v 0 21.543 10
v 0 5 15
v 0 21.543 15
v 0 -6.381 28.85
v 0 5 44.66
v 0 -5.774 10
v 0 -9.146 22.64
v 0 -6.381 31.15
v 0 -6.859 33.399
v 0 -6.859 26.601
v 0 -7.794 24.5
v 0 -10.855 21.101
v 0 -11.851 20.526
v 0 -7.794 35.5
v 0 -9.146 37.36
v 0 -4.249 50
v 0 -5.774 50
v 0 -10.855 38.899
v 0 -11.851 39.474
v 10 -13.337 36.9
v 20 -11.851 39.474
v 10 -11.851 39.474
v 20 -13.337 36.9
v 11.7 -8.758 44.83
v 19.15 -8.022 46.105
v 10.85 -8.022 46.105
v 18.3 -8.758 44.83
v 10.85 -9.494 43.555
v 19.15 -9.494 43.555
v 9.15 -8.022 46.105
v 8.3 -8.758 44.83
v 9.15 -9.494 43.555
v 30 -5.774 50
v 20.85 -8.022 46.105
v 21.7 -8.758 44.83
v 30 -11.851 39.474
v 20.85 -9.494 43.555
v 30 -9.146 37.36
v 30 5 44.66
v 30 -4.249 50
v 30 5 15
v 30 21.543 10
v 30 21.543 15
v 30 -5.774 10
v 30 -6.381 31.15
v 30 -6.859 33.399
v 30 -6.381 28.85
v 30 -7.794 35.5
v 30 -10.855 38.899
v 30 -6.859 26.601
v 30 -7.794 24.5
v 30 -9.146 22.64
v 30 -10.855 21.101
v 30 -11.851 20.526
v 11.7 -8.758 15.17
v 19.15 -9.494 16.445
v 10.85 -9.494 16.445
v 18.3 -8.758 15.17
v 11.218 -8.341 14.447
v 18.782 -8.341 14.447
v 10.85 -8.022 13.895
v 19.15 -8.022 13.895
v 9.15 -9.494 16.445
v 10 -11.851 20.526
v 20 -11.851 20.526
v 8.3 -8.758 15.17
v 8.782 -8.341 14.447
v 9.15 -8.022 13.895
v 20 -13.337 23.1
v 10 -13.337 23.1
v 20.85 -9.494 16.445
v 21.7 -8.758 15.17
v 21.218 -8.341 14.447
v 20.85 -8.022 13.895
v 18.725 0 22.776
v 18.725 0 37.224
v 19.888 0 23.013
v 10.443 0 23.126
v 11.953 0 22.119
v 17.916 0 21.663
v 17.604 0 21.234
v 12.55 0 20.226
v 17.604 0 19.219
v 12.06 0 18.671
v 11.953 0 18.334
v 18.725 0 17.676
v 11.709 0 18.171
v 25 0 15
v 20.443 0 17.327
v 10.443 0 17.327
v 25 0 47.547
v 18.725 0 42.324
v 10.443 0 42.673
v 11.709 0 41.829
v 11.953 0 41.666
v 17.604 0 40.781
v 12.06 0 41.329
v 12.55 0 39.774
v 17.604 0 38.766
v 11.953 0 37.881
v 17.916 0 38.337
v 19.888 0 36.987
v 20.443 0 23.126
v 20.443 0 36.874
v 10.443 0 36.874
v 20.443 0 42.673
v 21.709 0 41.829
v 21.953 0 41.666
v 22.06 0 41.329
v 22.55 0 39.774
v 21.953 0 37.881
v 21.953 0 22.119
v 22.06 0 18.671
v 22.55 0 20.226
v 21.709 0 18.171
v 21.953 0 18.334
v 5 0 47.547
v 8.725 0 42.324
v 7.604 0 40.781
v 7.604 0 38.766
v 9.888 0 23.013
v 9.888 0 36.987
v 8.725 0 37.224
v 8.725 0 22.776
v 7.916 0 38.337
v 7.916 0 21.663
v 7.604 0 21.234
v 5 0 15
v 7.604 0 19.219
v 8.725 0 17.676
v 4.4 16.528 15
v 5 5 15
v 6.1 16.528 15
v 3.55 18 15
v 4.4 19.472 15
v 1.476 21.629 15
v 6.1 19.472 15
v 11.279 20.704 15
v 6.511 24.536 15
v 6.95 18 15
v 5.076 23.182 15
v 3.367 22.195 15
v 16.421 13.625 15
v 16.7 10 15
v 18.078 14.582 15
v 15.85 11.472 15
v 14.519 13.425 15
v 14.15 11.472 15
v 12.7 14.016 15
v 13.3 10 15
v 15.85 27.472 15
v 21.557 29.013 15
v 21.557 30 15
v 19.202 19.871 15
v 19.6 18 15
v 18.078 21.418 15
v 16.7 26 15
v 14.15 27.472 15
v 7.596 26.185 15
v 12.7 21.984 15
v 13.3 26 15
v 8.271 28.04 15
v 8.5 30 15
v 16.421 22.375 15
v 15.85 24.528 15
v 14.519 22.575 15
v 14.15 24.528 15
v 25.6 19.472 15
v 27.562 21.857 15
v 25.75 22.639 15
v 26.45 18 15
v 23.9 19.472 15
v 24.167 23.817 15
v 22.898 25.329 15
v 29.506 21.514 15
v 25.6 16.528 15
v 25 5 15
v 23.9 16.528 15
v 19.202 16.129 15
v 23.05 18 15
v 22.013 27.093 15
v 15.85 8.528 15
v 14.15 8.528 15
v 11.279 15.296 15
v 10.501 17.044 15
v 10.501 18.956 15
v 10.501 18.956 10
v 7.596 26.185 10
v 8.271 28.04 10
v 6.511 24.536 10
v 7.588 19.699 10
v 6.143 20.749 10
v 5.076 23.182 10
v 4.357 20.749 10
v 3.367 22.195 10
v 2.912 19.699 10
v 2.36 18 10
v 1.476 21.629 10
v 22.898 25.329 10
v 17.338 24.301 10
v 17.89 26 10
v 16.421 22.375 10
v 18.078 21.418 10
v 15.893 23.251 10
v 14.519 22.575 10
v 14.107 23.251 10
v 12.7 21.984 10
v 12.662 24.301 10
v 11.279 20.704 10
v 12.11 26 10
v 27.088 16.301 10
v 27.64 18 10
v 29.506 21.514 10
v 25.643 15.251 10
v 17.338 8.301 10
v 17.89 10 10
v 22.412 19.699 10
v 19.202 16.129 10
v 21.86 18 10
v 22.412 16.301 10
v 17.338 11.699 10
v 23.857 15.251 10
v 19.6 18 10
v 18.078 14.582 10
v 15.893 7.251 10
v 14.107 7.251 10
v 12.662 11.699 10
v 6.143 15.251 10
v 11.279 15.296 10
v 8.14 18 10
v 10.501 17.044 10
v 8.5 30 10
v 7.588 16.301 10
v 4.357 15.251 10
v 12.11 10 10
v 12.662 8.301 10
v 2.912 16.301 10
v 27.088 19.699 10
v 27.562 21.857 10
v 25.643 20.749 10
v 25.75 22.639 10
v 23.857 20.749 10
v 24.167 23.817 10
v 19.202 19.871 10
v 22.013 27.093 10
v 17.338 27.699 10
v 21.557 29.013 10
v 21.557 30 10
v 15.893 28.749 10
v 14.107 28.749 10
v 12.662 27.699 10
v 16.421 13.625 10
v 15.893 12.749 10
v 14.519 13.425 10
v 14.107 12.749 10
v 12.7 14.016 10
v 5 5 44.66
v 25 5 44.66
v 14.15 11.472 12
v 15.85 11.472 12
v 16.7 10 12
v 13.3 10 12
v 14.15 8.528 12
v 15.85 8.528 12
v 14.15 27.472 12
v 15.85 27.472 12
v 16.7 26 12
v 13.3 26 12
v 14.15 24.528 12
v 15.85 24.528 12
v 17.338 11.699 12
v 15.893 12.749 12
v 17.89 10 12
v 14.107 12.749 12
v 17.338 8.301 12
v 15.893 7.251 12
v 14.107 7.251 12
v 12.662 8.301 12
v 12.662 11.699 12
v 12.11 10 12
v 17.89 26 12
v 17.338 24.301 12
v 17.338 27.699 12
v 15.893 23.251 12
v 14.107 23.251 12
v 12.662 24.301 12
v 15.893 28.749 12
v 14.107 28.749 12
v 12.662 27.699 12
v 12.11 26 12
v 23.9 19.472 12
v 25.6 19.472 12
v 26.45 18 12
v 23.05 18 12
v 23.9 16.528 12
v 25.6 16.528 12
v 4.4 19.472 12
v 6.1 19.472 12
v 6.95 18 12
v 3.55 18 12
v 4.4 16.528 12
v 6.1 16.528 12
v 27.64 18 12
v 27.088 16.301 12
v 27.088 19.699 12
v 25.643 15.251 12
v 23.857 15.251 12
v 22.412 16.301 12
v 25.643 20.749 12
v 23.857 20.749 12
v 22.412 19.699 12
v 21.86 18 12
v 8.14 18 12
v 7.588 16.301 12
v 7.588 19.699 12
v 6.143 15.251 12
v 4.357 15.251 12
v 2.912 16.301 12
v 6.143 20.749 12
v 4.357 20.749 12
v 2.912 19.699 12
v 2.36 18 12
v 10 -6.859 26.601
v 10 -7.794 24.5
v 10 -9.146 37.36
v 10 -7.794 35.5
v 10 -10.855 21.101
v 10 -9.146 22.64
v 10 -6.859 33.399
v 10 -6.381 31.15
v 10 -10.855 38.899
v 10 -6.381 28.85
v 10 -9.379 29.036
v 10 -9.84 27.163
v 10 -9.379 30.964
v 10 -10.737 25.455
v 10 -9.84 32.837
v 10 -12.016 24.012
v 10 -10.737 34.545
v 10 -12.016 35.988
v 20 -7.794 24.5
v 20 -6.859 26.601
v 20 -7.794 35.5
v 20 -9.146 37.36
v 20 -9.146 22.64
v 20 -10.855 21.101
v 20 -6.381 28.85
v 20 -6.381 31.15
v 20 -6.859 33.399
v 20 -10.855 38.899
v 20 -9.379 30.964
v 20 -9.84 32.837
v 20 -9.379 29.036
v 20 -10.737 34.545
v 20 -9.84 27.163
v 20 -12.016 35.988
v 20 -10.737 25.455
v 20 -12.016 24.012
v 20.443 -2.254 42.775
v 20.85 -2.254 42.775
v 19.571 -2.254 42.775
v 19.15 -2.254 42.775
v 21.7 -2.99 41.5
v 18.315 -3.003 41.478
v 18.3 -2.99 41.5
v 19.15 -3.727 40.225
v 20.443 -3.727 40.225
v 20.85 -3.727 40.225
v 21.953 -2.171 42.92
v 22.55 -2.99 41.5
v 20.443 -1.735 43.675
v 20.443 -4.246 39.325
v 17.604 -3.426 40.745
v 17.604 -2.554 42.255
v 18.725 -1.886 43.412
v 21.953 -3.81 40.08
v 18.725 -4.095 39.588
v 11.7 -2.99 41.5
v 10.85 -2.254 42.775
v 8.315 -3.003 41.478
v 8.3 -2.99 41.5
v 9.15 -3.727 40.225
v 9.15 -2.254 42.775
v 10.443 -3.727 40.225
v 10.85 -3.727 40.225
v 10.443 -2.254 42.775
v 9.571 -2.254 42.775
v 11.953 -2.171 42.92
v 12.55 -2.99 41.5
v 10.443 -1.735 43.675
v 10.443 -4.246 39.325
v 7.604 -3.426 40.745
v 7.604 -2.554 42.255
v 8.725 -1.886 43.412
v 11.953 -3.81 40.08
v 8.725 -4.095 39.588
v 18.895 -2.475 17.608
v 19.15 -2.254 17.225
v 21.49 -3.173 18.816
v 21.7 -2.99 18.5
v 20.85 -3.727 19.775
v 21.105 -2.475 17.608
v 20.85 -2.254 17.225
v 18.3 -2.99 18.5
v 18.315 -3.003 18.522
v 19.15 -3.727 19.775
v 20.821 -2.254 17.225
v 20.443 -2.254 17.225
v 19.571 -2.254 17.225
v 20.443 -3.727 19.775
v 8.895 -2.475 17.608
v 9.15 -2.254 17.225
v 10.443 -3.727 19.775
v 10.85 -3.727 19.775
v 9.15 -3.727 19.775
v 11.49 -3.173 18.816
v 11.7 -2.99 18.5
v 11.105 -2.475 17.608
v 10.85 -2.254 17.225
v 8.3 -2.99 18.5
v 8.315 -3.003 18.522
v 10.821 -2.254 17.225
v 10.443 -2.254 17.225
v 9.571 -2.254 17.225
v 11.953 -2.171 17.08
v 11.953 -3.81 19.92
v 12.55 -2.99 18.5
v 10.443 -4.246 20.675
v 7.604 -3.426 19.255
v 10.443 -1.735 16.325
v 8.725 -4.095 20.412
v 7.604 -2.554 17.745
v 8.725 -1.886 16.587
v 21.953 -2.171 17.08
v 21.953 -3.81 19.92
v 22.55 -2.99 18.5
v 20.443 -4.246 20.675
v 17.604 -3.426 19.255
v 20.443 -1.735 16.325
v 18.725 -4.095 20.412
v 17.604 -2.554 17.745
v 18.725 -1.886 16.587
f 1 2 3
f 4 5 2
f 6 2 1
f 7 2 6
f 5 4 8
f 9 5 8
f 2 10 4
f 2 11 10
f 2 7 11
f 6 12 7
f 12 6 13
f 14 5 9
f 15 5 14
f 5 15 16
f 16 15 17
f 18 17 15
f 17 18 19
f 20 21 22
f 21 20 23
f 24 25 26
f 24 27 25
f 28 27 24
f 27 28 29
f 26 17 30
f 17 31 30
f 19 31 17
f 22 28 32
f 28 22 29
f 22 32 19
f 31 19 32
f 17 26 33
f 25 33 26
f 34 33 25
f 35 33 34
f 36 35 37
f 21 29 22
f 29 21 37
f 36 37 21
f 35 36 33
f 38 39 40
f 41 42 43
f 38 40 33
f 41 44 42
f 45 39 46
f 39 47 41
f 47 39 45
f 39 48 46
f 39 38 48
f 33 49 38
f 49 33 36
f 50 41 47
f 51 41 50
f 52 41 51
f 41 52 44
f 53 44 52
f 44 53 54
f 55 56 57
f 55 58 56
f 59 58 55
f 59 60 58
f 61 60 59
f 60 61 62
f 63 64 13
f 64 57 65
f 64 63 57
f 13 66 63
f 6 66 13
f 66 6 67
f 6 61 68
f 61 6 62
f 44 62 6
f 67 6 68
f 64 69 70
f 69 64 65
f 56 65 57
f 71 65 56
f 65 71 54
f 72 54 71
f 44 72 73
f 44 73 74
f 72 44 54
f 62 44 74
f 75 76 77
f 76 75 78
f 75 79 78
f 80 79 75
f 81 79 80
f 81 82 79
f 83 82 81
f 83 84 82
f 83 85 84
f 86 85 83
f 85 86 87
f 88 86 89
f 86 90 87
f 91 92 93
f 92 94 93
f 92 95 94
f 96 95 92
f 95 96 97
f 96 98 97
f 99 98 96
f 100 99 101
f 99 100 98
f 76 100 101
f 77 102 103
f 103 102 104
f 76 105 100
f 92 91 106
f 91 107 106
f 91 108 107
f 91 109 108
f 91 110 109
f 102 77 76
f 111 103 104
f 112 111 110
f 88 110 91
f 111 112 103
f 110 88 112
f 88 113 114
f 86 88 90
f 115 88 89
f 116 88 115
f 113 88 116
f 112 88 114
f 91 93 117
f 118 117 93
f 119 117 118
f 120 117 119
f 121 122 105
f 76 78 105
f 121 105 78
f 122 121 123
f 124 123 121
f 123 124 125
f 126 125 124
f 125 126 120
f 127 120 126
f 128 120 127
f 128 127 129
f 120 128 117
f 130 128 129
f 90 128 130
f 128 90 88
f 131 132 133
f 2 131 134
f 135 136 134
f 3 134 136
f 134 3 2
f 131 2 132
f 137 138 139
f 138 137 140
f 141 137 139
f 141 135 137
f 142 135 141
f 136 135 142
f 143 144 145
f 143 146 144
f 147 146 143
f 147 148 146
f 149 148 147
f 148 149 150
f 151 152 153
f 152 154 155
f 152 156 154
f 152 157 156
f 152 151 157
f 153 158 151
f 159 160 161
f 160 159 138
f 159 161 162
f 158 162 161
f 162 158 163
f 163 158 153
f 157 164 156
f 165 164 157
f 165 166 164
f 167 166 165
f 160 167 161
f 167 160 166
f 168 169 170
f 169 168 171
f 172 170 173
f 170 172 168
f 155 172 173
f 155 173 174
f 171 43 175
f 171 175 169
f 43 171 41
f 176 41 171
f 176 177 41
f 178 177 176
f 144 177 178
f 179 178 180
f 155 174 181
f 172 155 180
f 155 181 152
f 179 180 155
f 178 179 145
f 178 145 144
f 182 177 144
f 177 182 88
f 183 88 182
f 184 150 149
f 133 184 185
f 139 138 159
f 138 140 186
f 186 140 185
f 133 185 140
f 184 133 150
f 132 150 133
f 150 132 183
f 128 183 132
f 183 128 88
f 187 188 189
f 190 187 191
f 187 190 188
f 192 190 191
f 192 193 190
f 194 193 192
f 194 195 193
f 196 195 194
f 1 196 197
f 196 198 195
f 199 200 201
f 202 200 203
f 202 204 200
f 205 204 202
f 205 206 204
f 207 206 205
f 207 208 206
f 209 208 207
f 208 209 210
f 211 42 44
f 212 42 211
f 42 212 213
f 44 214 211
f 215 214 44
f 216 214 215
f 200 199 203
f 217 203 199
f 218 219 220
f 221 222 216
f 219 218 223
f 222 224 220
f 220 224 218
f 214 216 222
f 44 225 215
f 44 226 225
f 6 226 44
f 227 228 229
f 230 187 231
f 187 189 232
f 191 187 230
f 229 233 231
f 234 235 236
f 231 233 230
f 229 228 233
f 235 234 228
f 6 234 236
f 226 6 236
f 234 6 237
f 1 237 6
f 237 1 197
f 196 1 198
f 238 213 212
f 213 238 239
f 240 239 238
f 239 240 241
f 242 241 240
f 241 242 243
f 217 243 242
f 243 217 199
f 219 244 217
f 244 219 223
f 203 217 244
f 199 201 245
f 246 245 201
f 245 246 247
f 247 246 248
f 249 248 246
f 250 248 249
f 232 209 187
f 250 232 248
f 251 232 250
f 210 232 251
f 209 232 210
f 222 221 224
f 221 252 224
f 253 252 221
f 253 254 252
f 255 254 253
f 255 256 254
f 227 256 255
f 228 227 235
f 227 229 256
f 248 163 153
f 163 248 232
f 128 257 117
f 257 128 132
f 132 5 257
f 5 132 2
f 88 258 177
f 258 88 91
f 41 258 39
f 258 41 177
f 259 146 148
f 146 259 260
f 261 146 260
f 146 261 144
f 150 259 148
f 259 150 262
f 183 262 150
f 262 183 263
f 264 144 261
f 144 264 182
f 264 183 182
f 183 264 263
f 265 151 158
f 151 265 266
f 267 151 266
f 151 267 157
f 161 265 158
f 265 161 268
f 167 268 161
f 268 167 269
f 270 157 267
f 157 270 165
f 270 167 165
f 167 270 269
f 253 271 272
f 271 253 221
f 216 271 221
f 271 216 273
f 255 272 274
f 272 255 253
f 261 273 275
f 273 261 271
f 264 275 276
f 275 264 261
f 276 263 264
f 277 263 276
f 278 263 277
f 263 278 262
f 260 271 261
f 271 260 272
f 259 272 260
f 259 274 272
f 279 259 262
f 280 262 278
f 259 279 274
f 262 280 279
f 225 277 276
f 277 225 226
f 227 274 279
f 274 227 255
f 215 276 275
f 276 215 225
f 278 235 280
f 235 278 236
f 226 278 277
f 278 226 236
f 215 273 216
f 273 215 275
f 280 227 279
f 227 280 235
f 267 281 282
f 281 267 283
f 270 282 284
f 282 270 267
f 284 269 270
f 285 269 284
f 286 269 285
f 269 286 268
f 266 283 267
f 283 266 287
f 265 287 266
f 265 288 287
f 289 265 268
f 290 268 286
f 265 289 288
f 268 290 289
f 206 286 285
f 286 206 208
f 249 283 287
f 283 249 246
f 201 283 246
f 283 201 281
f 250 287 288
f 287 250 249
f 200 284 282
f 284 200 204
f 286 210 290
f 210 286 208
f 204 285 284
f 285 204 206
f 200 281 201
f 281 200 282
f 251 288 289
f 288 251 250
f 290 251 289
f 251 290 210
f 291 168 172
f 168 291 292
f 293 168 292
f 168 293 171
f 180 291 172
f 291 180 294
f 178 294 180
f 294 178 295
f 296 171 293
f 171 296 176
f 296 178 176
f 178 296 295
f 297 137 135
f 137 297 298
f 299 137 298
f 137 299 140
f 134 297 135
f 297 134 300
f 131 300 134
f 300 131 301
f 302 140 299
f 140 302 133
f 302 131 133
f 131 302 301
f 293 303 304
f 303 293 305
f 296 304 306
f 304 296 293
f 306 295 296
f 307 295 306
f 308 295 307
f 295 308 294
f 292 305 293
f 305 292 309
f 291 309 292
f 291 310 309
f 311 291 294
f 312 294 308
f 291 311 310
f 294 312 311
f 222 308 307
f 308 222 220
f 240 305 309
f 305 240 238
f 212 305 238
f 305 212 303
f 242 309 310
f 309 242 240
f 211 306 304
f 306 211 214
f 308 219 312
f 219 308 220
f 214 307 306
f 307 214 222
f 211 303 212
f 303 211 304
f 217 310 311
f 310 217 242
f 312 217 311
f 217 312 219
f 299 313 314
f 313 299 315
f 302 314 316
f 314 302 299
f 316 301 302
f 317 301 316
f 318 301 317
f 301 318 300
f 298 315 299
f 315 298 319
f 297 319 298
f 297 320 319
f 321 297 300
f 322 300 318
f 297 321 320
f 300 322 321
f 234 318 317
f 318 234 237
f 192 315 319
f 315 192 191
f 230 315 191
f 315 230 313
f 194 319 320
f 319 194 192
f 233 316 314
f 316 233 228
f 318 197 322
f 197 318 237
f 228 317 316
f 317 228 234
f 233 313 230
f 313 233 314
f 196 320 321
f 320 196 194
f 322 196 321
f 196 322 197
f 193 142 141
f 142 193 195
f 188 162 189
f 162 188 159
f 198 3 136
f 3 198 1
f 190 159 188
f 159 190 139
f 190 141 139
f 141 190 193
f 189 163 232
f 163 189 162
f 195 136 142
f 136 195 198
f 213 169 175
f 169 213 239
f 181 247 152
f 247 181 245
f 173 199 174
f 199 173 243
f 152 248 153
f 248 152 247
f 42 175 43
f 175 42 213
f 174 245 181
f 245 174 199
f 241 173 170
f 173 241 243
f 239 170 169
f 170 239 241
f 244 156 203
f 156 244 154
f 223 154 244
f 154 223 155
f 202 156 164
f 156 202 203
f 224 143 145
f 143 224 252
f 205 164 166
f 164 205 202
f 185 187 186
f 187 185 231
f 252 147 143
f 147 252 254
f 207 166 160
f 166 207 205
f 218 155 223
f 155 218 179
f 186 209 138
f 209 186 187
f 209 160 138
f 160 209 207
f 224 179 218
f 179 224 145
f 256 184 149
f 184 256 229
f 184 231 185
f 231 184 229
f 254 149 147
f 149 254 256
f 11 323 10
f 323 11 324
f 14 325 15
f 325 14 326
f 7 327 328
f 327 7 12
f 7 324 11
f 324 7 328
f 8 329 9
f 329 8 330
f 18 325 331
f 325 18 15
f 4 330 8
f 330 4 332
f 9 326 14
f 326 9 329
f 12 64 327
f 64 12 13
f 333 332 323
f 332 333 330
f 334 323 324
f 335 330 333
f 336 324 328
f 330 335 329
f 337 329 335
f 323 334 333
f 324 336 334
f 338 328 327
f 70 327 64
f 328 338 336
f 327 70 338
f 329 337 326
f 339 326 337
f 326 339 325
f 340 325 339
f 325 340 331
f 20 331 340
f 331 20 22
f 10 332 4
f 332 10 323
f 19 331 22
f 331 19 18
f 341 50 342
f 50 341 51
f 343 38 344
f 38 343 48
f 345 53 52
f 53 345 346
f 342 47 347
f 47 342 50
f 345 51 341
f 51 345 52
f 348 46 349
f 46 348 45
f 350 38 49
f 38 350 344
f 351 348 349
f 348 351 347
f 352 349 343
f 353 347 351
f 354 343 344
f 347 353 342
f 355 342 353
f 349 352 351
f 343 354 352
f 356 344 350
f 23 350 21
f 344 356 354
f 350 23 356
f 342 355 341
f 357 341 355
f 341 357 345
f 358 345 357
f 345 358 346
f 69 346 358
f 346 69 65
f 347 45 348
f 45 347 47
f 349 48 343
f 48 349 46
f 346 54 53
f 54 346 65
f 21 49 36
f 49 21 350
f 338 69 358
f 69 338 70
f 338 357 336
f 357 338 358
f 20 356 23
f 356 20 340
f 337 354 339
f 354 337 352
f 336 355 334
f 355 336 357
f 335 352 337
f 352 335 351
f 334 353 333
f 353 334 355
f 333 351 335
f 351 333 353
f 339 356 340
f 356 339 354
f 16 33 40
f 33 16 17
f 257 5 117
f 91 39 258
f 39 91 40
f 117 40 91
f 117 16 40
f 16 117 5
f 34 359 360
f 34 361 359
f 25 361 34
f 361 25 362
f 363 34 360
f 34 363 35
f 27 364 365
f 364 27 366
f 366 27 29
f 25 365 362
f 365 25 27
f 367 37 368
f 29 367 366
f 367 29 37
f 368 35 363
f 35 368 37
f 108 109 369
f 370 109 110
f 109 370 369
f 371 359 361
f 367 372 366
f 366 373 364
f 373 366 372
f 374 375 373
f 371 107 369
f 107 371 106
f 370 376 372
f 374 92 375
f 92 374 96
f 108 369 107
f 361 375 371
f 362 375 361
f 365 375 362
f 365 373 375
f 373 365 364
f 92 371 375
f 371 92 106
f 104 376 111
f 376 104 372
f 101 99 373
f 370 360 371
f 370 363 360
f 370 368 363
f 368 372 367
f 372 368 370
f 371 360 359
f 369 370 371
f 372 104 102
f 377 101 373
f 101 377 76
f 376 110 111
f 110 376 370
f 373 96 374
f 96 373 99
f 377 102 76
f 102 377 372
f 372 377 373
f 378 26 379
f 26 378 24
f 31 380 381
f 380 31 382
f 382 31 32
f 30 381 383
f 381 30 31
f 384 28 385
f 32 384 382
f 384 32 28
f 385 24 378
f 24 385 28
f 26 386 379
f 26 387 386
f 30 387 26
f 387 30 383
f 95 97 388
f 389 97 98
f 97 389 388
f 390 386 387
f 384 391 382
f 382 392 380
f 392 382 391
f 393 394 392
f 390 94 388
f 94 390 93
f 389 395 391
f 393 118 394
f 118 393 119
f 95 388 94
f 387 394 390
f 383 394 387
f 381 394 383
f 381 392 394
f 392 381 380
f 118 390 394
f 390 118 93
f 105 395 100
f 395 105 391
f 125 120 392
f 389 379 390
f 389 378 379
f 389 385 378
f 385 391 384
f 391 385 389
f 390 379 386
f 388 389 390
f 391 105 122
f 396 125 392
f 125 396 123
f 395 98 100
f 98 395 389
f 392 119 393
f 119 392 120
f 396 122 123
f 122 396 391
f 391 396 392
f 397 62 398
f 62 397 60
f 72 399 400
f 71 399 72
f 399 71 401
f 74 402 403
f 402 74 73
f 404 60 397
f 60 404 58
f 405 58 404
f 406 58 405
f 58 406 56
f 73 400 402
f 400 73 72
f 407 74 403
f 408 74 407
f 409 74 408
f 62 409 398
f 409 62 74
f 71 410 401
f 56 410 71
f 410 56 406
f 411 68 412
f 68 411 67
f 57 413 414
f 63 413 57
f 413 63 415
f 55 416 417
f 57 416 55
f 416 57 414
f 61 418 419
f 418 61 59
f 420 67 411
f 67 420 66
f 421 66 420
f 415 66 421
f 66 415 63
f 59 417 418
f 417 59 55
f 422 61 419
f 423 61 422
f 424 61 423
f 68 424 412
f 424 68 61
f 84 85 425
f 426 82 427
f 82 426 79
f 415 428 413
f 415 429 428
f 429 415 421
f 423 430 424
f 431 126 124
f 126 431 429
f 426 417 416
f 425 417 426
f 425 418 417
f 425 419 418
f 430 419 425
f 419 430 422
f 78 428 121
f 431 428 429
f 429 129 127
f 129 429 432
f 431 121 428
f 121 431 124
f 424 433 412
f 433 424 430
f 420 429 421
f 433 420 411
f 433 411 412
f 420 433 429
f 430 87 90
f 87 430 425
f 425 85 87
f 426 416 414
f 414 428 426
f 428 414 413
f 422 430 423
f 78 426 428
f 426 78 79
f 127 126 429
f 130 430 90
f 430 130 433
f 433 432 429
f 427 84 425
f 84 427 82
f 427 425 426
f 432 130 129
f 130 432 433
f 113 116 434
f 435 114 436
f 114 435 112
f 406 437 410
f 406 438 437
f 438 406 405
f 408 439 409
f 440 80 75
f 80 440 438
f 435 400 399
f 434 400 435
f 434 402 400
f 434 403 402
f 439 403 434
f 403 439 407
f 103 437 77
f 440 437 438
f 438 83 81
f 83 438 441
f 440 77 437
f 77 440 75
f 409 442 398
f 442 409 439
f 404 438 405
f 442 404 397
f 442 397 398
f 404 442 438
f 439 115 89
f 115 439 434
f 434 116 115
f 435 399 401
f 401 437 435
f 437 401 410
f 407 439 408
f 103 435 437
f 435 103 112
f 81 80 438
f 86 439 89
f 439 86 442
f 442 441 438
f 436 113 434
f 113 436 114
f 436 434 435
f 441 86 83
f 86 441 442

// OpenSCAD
mountHeight = 60;
mountWidth = mountHeight/2;
mountDepth = tan(30)*mountWidth;
mountSize = mountWidth/6;
drillSize = 1.7;
gridUnit = mountWidth/3;

module strut() 
{   
    difference() {
        union() {
            translate([0, 0, 0])
                polyhedron(
                    points=[[0,0,0],[mountWidth,0,0], [mountWidth,0,mountHeight],[0,0,mountHeight],[0,-mountDepth,mountWidth], [mountWidth,-mountDepth,mountWidth]],
                    faces=[[0,4,3],[4,5,2,3],[1,2,5],[4,0,1,5],[0,3,2,1]], center = true
                );
            //translate([0, -mountSize, 5]) cube([mountWidth, mountSize, mountHeight]);
            translate([0, 0,10]) cube([mountWidth, mountWidth, mountSize]);
            
            // Frame supports
            translate([0, 0, mountSize+5]) cube([mountSize, mountSize, mountHeight]);
            translate([mountWidth-mountSize, 0, mountSize+5]) cube([mountSize, mountSize, mountHeight]);
            
            // Motor screw mounts
            translate([mountWidth/2, (mountWidth/2), 12.5]) cube([mountSize, mountWidth, mountSize], true);
            translate([mountWidth/2, 18, 12.5]) cube([mountWidth, mountSize, mountSize], true);
            
        }
        
        union() {

            /// Motor mount screw holes
            translate([mountWidth/2, 10, -mountSize/2]) cylinder(mountWidth, drillSize, drillSize);
            translate([mountWidth/2, 26, -mountSize/2]) cylinder(mountWidth, drillSize, drillSize);
            
            translate([mountWidth/2, 10, 7]) cylinder(5, drillSize*1.7, drillSize*1.7);
            translate([mountWidth/2, 26, 7]) cylinder(5, drillSize*1.7, drillSize*1.7);
            
            
            translate([(mountWidth/2)+9.75, 18, -mountSize/2]) cylinder(mountWidth, drillSize, drillSize);
            translate([(mountWidth/2)-9.75, 18, -mountSize/2]) cylinder(mountWidth, drillSize, drillSize);
            
            translate([(mountWidth/2)+9.75, 18, 7]) cylinder(5, drillSize*1.7, drillSize*1.7);
            translate([(mountWidth/2)-9.75, 18, 7]) cylinder(5  , drillSize*1.7, drillSize*1.7);
            
            
            // Cutaways
            translate([0, 30, -mountSize/2]) cylinder(mountWidth, drillSize*5, drillSize*5);
            translate([30, 30, -mountSize/2]) cylinder(mountWidth, drillSize*5, drillSize*5);
            
            // Rotary space
            translate([mountWidth/2, 18, -1]) cylinder(mountWidth, 4.6, 4.6);
            
            // Hollowing cube
            //translate([15, -5, 30]) cube([15, 50, 15], true);
            
            // Space for bearings
            translate([0, -mountDepth, mountHeight/2]) 
                rotate([0,90,0]) {
                    cylinder(mountWidth/3, 11, 11);
                }
                
            translate([20, -mountDepth, mountHeight/2]) 
                rotate([0,90,0]) {
                    cylinder(mountWidth/3, 11, 11);
                }
                
            // Space for Axle
            translate([0, -mountDepth, mountHeight/2]) 
                rotate([0,90,0]) {
                    cylinder(mountWidth+1, 8, 8);
                }
            
            // Flatten top
            translate([-1, -30, mountHeight-10]) 
                //rotate([0,0,0]) {
                    cube([mountWidth+2, mountHeight, mountHeight]);
                //}
            
            // Bevel top
            translate([-1, 20, mountHeight-24]) 
                rotate([60,0,0]) {
                    cube([mountWidth+2, mountHeight, mountHeight]);
                }
                
            // Flatten bottom
            translate([-1, -15, -5]) cube([mountWidth+2, mountWidth+20, 15]);
            
        }
        
        
        
        union() {
            
            ///  Frame fixtures
            
            // Through hole 1
            translate([gridUnit*2, gridUnit, 34]) 
                rotate([60,0,0]) {  
                    cylinder(mountSize*10, drillSize, drillSize); 
                }
            
            // Head gap 1
            translate([gridUnit*2, gridUnit, 34]) 
                rotate([60,0,0]) {  
                    cylinder(mountSize*3, drillSize*1.5, drillSize*1.5); 
                }
                
            // Through hole 2 
            translate([gridUnit, gridUnit, 34]) 
                rotate([60,0,0]) {  
                    cylinder(mountSize*10, drillSize, drillSize); 
                } 
            // Head gap 2
            translate([gridUnit, gridUnit, 34]) 
                rotate([60,0,0]) {  
                    cylinder(mountSize*3, drillSize*1.5, drillSize*1.5); 
                }
                
            // Through hole 3
            translate([gridUnit*2, gridUnit, 26]) 
                rotate([120,0,0]) {  
                    cylinder(mountSize*10, drillSize, drillSize); 
                }
           // Head gap 3  
           translate([gridUnit, gridUnit, 26]) 
                rotate([120,0,0]) {  
                    cylinder(mountSize*10, drillSize, drillSize); 
                }
            
            // Through hole 4
            translate([gridUnit, gridUnit, 26]) 
                rotate([120,0,0]) {  
                    cylinder(mountSize*3, drillSize*1.5, drillSize*1.5); 
                }
            // Head gap 4    
            translate([gridUnit*2, gridUnit, 26]) 
                rotate([120,0,0]) {  
                    cylinder(mountSize*3, drillSize*1.5, drillSize*1.5); 
                }
        }
        
    }
    
           
    
}

strut();
